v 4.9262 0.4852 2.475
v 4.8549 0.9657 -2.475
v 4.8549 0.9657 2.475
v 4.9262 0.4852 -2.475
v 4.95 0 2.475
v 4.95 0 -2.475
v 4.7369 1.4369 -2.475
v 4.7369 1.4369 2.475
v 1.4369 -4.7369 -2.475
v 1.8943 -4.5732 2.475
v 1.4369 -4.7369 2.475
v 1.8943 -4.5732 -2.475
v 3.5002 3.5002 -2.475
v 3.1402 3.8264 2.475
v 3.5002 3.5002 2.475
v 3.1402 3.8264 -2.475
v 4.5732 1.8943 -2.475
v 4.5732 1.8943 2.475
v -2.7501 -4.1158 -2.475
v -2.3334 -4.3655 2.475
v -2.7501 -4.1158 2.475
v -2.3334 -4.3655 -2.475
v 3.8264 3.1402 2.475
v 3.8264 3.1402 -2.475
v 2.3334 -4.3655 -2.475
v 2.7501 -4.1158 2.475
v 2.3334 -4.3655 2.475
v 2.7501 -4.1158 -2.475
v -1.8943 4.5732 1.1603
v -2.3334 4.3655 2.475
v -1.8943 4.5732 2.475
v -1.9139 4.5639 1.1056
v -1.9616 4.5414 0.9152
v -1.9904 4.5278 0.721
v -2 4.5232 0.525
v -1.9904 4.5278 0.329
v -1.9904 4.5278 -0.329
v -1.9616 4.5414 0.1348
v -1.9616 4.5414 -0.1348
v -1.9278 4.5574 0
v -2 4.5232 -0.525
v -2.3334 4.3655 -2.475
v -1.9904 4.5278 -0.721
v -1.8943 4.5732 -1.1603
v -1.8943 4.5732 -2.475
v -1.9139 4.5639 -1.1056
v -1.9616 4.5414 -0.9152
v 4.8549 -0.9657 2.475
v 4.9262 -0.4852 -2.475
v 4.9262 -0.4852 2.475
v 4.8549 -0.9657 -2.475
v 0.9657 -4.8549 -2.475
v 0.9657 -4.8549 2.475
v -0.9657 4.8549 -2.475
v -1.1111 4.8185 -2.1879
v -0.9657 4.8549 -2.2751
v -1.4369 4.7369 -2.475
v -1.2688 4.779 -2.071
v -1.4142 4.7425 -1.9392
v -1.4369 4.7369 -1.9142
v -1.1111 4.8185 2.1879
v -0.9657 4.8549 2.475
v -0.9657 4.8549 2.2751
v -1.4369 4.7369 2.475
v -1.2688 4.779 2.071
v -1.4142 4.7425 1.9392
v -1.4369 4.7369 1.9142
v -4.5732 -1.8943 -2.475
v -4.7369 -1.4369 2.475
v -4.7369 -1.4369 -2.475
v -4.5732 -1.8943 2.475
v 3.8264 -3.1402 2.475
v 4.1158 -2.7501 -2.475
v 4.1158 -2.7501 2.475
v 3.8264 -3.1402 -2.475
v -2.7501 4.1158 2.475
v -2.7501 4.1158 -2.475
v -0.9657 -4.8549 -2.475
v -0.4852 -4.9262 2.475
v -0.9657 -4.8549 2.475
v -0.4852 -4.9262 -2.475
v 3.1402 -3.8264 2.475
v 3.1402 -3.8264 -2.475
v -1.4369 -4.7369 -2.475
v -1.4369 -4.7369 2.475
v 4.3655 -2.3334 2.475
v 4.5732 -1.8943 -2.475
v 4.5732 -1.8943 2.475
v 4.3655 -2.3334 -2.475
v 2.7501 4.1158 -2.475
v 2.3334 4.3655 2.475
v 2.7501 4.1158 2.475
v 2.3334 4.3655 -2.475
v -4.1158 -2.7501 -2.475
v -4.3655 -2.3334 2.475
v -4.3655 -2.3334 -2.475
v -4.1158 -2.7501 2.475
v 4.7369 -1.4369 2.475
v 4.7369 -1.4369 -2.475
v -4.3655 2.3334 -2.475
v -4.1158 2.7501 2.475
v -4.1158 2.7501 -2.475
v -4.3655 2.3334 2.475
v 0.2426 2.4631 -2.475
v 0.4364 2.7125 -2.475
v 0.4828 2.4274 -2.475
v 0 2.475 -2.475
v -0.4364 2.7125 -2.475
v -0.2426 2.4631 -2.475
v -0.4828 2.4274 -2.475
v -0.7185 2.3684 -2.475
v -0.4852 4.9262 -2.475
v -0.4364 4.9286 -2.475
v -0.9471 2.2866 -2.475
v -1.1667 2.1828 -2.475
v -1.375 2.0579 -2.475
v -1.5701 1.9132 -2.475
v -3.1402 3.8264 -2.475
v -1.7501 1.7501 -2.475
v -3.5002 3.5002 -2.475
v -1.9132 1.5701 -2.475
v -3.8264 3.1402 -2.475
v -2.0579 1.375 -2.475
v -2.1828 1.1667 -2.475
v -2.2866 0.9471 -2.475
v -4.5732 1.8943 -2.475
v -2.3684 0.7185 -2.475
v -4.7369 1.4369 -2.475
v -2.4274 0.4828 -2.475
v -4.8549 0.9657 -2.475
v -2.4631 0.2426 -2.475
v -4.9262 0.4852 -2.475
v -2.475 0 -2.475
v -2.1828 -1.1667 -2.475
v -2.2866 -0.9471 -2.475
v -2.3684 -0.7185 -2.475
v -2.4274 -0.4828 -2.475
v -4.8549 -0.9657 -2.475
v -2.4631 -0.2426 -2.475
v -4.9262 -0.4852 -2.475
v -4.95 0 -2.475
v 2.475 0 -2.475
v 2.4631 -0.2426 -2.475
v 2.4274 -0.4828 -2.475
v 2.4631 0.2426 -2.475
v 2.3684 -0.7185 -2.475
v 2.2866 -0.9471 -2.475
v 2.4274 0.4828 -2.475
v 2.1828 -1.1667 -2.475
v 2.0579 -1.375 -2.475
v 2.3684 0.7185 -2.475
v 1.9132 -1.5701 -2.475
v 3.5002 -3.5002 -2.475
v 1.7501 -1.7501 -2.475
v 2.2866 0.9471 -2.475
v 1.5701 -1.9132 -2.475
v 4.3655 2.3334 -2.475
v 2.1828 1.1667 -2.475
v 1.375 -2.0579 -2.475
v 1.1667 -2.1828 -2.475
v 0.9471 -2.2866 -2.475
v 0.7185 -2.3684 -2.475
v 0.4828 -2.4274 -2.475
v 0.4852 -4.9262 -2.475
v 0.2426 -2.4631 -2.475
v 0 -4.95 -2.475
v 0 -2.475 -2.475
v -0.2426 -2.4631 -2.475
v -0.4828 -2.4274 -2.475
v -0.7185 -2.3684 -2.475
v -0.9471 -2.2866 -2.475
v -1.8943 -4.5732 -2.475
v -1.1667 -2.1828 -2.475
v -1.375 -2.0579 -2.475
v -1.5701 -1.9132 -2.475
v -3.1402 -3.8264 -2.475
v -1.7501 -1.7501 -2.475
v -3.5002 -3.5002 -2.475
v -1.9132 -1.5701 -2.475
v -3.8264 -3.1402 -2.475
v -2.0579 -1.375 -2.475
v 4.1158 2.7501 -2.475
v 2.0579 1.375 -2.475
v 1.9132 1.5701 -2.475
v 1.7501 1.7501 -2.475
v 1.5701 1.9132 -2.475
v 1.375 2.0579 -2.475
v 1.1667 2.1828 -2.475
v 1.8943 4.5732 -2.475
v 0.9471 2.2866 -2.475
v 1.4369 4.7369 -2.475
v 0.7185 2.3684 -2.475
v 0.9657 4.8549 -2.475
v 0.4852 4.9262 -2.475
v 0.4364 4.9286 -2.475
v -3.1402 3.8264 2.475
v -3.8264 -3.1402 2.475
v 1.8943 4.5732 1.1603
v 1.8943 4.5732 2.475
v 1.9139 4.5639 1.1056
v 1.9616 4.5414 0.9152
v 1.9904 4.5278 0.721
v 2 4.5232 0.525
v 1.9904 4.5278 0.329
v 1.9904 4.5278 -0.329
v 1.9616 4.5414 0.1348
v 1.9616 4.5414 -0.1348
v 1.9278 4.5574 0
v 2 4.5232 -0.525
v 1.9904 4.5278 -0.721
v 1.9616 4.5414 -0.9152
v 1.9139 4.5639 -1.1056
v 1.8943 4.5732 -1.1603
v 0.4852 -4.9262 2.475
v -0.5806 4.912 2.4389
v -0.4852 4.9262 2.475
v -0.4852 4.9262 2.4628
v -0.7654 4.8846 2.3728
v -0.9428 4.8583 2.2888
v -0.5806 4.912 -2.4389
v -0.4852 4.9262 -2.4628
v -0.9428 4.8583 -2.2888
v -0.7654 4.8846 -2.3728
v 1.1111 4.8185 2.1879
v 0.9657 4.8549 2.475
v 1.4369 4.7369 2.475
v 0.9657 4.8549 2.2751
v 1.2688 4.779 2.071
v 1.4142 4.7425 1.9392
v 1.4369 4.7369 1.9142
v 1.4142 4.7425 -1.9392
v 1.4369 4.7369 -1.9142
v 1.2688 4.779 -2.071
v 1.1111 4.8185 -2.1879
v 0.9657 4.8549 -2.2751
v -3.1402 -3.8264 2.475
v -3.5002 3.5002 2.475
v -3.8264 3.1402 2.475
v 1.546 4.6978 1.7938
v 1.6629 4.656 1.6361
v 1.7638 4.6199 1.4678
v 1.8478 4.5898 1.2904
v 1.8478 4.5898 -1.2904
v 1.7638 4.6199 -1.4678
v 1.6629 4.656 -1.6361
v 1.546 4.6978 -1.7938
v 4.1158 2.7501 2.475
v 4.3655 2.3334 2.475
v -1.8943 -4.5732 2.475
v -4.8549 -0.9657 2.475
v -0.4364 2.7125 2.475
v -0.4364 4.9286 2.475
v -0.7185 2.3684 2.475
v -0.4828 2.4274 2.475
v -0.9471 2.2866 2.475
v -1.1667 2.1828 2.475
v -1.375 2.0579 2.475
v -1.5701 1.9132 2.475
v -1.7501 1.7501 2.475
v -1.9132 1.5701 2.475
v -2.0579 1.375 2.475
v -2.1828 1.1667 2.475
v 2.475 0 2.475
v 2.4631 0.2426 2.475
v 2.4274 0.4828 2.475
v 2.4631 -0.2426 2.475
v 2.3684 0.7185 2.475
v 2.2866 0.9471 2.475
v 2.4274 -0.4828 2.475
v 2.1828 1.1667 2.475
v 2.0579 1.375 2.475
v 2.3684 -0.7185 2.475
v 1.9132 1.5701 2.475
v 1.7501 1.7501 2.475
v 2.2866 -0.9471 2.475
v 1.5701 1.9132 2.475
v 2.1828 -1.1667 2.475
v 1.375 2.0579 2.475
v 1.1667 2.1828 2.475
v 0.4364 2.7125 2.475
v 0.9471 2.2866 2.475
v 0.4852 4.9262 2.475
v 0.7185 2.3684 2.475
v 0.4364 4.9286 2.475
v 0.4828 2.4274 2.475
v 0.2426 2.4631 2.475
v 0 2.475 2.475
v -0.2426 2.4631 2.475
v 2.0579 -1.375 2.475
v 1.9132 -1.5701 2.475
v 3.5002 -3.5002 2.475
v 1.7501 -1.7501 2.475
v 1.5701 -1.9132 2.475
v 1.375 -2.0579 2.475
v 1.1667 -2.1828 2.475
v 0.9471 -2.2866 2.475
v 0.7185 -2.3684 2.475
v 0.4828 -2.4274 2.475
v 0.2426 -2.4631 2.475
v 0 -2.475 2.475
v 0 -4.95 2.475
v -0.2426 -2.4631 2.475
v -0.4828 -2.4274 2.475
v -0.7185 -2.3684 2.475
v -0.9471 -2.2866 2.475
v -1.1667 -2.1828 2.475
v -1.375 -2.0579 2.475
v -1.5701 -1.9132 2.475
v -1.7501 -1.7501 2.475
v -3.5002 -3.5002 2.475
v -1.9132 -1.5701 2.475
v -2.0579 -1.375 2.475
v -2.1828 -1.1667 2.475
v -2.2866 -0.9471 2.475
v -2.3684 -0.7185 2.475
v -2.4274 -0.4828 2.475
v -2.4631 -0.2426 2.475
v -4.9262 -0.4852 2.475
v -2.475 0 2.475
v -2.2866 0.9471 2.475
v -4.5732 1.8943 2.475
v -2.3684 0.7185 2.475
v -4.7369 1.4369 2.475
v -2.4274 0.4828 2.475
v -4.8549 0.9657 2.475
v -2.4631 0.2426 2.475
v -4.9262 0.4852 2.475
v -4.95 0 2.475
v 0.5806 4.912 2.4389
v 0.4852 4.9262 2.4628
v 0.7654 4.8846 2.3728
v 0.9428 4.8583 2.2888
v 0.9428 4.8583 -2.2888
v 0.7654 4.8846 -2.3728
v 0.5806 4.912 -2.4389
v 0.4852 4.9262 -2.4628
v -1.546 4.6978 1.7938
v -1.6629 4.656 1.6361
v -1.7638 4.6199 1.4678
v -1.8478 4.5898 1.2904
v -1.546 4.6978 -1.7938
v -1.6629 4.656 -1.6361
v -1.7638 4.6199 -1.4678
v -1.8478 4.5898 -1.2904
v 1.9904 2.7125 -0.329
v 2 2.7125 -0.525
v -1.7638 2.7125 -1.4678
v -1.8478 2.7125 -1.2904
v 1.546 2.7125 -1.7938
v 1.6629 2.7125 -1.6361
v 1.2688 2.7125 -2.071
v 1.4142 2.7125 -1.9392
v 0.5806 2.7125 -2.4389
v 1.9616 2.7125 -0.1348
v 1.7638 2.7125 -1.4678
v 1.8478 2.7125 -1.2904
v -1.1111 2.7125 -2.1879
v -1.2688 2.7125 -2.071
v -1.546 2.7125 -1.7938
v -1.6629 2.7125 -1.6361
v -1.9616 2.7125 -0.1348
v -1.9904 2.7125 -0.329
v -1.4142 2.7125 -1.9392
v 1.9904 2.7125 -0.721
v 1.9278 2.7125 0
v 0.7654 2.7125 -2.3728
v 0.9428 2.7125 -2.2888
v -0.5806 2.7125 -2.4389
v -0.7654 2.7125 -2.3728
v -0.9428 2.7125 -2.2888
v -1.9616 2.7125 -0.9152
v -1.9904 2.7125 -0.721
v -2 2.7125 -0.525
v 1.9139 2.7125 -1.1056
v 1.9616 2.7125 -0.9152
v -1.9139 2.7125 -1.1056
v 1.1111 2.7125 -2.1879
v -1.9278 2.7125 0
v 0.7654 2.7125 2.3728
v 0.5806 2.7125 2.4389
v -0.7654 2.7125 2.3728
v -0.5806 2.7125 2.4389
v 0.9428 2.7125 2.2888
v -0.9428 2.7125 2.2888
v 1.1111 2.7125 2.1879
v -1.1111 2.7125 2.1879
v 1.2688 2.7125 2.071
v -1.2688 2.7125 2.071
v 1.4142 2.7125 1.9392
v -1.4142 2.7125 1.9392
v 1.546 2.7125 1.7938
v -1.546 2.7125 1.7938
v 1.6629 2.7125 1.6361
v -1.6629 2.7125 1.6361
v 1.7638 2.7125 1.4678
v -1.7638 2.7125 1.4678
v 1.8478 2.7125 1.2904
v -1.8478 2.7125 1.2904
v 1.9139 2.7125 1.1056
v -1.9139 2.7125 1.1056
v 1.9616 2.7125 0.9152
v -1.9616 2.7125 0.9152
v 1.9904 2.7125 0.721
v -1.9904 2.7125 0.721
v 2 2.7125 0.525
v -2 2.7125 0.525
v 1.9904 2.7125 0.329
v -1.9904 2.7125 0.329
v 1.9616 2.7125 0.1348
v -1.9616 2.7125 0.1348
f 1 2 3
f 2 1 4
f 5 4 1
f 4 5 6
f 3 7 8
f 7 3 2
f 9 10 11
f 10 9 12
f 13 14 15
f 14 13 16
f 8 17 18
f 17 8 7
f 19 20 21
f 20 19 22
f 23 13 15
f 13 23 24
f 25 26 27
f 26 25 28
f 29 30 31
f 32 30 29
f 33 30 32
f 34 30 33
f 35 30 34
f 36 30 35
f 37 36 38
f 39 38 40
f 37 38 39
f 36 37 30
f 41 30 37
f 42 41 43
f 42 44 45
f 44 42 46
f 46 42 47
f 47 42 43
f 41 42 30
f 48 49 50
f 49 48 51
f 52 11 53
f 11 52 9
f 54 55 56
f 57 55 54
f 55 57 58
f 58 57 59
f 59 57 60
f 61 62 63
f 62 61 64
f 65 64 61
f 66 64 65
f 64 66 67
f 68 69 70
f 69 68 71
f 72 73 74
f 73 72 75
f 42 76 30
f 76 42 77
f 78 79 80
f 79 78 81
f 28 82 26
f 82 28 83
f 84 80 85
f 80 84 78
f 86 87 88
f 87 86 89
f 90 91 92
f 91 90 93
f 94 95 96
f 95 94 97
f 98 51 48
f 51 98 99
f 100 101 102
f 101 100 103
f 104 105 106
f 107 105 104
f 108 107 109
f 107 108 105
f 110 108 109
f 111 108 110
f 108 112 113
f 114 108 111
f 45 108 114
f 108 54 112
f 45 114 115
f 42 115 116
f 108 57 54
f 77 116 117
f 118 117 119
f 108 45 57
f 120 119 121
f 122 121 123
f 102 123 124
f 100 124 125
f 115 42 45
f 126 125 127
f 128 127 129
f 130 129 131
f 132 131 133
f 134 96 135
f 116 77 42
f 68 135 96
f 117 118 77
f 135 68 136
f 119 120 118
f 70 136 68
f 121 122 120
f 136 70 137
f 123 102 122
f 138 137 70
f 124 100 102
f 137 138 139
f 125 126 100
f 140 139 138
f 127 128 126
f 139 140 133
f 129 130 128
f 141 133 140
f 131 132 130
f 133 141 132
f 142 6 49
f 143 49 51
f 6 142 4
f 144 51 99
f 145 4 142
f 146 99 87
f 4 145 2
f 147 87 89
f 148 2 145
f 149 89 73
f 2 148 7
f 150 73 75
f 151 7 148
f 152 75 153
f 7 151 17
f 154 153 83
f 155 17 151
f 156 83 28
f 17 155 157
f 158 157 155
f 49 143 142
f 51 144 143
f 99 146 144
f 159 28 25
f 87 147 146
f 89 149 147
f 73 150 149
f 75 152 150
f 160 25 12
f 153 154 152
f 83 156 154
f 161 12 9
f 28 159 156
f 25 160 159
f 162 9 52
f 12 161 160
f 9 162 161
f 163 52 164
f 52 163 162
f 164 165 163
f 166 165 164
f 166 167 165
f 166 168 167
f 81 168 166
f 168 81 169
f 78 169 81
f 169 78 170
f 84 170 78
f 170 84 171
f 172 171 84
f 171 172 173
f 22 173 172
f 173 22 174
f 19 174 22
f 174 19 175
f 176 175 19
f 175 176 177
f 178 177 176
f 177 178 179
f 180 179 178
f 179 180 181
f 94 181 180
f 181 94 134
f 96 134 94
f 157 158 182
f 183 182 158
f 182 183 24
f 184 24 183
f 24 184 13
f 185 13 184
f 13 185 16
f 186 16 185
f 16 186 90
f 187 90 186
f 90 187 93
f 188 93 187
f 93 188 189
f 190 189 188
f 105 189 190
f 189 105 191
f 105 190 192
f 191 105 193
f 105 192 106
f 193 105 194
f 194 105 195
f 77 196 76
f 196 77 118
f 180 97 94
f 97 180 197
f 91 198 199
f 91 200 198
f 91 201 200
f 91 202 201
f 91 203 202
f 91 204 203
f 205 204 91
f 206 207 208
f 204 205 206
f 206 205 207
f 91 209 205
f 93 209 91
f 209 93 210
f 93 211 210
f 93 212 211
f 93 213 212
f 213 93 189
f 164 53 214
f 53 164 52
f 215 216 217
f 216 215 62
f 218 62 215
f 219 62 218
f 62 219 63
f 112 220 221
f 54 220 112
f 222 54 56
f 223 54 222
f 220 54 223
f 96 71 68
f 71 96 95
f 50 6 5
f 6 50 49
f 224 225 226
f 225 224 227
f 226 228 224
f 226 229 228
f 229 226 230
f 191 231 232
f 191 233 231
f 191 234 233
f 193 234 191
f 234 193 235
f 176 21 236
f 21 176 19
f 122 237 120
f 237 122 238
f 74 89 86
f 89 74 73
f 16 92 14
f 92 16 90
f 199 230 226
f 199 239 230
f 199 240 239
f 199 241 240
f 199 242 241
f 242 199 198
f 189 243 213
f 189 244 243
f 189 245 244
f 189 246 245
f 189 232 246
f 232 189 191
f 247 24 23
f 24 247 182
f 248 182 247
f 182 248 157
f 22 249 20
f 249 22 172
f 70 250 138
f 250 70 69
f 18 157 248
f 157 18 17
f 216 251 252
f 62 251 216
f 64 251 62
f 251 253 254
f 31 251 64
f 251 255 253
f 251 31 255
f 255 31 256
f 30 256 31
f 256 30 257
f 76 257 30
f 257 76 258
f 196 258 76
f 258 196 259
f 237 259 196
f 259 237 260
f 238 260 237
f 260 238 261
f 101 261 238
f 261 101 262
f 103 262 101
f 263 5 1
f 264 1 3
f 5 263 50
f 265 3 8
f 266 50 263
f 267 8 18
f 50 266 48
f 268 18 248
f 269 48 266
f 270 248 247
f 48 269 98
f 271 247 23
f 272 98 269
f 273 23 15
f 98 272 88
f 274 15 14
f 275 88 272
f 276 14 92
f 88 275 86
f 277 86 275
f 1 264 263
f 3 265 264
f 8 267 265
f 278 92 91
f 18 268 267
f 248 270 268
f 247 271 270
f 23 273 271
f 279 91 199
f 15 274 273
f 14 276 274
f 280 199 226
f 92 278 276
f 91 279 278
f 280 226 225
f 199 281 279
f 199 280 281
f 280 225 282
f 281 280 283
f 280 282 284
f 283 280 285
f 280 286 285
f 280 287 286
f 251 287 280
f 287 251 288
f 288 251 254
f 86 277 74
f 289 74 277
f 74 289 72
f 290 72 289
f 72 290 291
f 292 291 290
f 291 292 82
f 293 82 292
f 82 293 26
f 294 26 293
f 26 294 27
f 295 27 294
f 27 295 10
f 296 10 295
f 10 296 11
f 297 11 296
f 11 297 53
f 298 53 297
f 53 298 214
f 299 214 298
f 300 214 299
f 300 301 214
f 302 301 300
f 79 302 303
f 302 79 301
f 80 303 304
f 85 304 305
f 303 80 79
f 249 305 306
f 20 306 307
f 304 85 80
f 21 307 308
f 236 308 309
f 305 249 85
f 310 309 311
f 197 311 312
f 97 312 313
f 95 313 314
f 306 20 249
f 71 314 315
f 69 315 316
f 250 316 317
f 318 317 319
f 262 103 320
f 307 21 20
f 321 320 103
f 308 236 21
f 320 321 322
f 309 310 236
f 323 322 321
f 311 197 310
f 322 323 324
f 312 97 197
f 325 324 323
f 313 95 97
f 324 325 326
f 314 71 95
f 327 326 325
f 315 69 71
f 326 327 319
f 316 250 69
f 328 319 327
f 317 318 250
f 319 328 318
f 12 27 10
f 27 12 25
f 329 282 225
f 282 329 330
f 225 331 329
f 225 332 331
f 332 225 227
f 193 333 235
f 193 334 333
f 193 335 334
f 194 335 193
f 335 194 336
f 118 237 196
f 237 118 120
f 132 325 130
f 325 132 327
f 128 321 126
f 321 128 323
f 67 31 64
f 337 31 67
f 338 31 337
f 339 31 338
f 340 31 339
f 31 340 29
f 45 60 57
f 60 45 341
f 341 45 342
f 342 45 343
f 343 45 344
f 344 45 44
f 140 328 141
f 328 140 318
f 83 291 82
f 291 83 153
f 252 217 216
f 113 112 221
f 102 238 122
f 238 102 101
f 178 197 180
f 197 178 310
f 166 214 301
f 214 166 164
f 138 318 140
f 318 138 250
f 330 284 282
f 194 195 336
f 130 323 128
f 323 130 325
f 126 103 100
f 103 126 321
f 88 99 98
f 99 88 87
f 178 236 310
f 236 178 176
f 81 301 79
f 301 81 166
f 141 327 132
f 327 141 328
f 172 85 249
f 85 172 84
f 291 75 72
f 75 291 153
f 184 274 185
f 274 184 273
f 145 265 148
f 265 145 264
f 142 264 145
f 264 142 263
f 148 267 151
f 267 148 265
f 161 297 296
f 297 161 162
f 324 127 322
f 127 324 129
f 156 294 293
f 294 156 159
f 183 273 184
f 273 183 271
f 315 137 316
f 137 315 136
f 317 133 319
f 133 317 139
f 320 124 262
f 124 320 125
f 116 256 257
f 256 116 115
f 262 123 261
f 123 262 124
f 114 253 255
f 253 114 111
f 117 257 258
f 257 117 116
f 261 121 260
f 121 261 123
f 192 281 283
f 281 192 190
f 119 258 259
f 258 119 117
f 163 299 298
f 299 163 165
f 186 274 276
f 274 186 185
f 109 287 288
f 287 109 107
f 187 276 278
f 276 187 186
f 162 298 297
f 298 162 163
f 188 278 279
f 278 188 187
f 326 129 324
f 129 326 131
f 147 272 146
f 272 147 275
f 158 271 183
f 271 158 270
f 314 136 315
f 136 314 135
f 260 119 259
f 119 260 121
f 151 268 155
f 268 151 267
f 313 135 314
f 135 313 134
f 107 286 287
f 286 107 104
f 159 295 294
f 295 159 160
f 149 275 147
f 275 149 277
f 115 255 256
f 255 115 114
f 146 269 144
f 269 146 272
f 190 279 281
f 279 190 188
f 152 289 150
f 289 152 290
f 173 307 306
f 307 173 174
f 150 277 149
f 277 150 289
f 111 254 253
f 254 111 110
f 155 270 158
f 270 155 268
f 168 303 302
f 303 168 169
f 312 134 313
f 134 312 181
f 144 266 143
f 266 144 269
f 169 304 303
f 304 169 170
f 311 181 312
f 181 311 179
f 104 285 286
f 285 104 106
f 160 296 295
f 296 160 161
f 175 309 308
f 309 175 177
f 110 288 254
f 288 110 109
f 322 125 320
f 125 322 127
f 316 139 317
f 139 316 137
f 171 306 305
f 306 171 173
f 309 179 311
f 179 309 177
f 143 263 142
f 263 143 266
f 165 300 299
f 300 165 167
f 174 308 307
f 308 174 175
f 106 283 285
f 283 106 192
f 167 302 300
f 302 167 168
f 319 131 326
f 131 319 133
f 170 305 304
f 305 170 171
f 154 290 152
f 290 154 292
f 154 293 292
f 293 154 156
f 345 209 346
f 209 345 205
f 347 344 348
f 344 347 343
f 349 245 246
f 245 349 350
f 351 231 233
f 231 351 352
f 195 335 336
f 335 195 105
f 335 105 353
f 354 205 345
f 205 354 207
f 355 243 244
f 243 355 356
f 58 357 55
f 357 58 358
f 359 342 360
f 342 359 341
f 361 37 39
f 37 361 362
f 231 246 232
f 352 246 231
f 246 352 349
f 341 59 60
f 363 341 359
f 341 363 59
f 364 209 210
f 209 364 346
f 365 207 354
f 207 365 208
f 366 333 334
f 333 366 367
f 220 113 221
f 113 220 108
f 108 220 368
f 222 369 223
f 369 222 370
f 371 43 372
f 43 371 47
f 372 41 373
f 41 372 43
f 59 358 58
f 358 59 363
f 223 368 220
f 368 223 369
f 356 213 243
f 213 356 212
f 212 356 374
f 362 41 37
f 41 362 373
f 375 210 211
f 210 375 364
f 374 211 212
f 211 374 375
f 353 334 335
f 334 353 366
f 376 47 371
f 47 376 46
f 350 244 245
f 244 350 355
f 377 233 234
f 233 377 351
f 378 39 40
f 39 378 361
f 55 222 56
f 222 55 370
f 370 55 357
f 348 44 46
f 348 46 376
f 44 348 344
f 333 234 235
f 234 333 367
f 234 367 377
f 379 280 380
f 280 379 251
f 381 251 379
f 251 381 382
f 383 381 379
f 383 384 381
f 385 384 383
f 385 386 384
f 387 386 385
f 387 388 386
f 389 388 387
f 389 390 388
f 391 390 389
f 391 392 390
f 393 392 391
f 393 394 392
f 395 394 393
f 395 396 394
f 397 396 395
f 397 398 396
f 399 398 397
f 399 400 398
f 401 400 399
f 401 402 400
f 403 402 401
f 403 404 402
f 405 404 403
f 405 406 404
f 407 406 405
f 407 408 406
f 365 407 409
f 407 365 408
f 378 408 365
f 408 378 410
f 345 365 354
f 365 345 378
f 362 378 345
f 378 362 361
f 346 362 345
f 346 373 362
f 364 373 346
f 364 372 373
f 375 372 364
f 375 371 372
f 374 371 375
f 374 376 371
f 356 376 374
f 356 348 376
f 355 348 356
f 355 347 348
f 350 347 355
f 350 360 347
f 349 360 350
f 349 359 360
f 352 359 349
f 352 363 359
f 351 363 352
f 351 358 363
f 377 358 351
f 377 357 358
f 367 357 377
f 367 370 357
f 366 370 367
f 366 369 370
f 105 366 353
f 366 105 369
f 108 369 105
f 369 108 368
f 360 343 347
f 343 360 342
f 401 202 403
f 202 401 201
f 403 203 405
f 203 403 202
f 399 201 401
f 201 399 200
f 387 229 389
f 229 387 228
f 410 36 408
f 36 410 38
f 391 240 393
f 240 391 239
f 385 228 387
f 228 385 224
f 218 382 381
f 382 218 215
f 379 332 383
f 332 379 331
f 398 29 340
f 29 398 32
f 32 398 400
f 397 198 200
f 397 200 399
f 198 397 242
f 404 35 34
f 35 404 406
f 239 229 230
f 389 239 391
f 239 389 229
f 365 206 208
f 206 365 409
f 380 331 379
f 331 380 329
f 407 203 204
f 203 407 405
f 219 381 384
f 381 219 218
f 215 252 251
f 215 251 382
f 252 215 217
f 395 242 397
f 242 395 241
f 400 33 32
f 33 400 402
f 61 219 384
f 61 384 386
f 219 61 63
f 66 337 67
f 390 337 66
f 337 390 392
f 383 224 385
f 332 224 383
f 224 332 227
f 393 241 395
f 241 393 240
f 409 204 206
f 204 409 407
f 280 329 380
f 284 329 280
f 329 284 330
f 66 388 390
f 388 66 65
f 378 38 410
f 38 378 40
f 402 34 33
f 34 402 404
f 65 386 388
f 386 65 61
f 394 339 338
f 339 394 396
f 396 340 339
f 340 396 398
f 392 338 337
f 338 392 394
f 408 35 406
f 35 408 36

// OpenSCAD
// COBRA Vertebra - C1 V0
// Height: 4.95mm, OD: 9.9mm

$fn = 64;

difference() {
    // Outer cylinder
    cylinder(h=4.95, d=9.9, center=true);
    
    // Inner channel
    cylinder(h=6.95, d=4.95, center=true);

    // Pivot holes
    translate([0, 4.95, -0.5249999999999999])
    rotate([90, 0, 0])
    cylinder(h=4.475, d=4, center=true);
    
    translate([0, 4.95, 0.5249999999999999])
    rotate([90, 0, 0])
    cylinder(h=4.475, d=4, center=true);
}
